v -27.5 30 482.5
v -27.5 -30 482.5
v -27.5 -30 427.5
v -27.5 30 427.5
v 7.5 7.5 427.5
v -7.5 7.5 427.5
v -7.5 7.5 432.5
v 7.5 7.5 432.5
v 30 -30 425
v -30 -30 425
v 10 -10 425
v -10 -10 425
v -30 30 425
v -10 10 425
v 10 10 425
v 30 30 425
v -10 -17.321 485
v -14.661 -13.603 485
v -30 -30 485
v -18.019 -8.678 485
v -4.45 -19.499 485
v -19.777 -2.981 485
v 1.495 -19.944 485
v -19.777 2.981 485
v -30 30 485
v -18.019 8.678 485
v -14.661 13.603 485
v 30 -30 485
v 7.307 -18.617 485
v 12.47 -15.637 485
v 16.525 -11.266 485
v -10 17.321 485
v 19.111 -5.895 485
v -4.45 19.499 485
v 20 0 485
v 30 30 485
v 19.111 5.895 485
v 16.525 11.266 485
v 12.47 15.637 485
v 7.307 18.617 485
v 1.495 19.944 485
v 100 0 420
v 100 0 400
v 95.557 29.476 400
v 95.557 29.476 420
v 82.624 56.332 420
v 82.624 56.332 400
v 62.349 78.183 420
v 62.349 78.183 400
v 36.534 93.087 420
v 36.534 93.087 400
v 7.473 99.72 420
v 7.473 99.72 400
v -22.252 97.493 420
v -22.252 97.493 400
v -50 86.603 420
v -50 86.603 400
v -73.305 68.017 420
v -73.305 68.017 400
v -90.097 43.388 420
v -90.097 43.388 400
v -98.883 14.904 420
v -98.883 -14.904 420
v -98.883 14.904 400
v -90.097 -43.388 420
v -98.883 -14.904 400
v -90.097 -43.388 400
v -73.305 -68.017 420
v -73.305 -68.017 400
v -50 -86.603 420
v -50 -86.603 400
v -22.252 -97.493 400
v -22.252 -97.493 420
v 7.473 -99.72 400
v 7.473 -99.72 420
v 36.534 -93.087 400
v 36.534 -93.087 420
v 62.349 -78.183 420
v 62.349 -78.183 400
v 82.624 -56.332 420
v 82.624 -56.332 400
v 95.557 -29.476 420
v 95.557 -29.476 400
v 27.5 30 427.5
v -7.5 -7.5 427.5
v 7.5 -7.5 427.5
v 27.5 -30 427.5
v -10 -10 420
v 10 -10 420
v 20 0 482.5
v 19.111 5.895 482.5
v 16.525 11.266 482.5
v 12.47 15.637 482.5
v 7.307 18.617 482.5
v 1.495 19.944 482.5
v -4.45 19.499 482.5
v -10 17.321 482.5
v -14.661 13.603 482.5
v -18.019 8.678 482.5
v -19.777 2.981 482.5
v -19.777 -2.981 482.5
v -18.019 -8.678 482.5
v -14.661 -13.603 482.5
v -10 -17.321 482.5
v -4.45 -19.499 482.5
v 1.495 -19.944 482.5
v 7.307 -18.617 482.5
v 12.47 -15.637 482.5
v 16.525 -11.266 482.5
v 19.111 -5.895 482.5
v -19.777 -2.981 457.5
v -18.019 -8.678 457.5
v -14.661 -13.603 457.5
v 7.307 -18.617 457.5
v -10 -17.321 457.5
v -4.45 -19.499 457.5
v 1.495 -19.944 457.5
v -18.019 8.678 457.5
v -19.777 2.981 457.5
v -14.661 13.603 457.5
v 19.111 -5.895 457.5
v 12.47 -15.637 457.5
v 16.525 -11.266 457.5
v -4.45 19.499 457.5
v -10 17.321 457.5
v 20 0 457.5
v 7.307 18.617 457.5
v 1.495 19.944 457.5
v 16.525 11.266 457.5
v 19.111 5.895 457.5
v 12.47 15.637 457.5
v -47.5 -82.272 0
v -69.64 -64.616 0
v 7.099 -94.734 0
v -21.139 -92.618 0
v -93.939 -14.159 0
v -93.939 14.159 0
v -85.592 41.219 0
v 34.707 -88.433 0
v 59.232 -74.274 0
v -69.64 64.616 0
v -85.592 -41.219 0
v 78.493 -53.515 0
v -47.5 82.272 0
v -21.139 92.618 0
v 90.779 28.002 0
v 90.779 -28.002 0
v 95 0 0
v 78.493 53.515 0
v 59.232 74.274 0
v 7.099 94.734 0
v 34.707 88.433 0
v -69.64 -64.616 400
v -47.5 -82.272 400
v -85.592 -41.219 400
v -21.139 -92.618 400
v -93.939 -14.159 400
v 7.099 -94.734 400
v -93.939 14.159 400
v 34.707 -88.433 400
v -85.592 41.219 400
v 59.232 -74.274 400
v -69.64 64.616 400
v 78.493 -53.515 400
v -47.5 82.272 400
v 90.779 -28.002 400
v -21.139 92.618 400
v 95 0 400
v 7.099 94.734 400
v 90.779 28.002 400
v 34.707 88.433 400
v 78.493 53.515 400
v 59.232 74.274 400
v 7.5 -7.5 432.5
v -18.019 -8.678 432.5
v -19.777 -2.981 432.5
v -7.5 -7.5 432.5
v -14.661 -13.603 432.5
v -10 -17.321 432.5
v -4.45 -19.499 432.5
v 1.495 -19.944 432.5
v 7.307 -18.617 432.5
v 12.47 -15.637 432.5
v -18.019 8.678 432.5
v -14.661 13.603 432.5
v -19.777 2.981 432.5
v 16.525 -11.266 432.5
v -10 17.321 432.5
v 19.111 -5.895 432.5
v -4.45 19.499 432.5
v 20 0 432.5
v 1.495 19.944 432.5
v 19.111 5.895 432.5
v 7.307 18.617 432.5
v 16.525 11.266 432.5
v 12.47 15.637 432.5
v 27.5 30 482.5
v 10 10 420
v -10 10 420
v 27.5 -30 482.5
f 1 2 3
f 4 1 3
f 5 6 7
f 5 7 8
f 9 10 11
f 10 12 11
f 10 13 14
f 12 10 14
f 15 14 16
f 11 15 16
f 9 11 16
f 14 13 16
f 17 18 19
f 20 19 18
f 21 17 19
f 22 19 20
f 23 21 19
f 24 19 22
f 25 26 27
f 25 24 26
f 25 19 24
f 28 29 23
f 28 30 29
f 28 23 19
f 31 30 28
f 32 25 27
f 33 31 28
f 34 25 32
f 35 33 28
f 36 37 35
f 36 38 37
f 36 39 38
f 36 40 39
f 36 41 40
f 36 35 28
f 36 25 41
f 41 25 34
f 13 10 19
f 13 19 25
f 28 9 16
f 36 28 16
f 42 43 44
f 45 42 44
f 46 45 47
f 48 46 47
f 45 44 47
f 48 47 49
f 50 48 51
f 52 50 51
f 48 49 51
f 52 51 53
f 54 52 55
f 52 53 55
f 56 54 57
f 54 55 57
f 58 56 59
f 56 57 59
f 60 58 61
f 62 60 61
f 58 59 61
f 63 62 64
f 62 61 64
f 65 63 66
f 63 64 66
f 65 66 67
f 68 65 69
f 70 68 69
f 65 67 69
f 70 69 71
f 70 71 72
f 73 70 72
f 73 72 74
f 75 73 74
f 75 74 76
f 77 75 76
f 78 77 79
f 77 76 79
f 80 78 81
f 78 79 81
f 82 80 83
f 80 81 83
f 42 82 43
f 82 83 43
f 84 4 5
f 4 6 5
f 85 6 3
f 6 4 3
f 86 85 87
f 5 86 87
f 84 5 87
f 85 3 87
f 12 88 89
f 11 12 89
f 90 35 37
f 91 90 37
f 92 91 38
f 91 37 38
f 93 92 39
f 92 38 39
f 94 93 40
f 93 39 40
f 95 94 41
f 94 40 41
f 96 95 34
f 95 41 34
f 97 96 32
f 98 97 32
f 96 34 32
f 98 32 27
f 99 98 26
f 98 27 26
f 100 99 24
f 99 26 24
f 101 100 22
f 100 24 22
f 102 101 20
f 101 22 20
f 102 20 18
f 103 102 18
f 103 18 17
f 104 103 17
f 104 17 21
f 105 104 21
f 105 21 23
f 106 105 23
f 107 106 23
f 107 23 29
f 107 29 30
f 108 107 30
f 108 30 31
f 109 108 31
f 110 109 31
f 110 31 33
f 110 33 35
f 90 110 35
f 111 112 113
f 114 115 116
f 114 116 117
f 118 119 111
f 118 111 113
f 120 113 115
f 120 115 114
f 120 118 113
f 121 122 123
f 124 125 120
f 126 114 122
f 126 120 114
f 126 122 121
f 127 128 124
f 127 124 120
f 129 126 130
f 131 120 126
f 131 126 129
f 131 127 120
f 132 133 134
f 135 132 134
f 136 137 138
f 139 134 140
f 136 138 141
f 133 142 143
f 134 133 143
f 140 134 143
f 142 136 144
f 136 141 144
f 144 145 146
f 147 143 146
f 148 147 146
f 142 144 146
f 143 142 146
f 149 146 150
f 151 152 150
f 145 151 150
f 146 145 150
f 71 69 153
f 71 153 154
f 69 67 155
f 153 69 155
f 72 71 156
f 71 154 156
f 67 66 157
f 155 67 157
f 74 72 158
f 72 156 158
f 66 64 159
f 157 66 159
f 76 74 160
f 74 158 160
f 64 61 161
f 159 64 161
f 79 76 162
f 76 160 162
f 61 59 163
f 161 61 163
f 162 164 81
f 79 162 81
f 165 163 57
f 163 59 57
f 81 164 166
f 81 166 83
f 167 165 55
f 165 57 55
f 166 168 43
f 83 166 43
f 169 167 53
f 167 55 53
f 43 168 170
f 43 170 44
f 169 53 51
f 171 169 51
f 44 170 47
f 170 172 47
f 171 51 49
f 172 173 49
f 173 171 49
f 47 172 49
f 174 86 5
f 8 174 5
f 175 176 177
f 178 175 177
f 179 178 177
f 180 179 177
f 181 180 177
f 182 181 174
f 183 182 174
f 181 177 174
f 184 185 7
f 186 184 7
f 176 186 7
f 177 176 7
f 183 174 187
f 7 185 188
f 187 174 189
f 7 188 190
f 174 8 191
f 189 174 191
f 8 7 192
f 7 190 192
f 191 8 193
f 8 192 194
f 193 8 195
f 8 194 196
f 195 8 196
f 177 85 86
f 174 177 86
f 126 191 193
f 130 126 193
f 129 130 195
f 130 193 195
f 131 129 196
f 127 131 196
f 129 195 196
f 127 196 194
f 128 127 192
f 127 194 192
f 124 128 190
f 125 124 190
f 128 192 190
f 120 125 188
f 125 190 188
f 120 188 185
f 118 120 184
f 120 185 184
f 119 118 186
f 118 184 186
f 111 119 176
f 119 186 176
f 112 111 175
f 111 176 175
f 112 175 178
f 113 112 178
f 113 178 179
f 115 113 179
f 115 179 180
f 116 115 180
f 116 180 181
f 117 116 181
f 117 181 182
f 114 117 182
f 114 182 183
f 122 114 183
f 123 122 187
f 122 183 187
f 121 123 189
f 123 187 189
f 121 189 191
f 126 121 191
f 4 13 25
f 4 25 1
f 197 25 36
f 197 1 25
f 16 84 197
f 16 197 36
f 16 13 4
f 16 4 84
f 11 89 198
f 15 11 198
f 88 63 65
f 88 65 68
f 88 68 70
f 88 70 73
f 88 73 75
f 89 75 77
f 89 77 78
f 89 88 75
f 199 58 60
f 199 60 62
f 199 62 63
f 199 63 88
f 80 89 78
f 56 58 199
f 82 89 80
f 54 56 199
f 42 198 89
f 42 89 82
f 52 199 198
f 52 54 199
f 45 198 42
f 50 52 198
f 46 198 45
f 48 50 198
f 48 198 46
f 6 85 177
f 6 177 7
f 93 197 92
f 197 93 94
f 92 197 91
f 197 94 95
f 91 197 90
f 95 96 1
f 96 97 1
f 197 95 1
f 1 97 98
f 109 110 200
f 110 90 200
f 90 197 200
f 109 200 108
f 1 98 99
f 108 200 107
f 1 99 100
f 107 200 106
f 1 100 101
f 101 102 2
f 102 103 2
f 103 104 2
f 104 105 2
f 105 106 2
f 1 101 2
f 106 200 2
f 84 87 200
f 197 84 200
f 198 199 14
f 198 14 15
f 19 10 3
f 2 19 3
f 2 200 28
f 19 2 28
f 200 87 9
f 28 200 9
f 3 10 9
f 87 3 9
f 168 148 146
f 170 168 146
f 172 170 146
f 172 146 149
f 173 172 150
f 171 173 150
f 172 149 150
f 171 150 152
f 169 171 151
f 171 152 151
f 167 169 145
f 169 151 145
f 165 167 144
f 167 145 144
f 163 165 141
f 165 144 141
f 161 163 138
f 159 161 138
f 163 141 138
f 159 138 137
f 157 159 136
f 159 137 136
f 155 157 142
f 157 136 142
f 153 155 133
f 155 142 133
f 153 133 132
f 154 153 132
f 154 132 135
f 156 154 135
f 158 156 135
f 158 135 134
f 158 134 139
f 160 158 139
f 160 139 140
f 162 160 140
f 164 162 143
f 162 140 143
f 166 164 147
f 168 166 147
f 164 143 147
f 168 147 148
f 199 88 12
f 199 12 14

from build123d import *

# Parameters (mm, degrees)
F0_R      = 95
F1_DEPTH  = 400
F2_R      = 100
F2_R_2    = 95
F3_DEPTH  = 20
F4_W      = 20
F4_H      = 20
F5_DEPTH  = 5
F6_W      = 60
F6_H      = 60
F6_W_2    = 20
F6_H_2    = 20
F7_W      = 20
F7_H      = 20
F8_DEPTH  = 60
F10_DEPTH = 130.001
F11_R     = 20
F12_DEPTH = 25
F13_W     = 15
F13_H     = 15
F14_DEPTH = 5
F15_R     = 20
F15_W     = 15
F15_H     = 15
F16_DEPTH = 25


with BuildPart() as f1:
    # F0 (on Top) → F1 (new body)
    with BuildSketch(Plane.XY):
        Circle(F0_R)
    extrude(amount=F1_DEPTH)

    # F2 (on face) → F3 (join)
    with BuildSketch(Plane.XY.offset(400)):
        Circle(F2_R)
        Circle(F2_R_2, mode=Mode.SUBTRACT)
        Circle(F2_R_2)
    extrude(amount=F3_DEPTH)

    # F4 (on face) → F5 (join)
    with BuildSketch(Plane.XY.offset(420)):
        Rectangle(F4_W, F4_H)
    extrude(amount=F5_DEPTH)

    # F6 (on face) + F7 (on face) → F8 (join)
    with BuildSketch(Plane.XY.offset(425)):
        Rectangle(F6_W, F6_H)
        Rectangle(F6_W_2, F6_H_2, mode=Mode.SUBTRACT)
    with BuildSketch(Plane.XY.offset(425)):
        Rectangle(F7_W, F7_H)
    extrude(amount=F8_DEPTH)

    # F9 (on face) → F10 (cut, through all)
    with BuildSketch(Plane.XZ.offset(30)):
        Polygon((-27.5, 427.5), (0, 427.5), (27.5, 427.5), (27.5, 482.5), (0, 482.5), (-27.5, 482.5), align=None)
    extrude(amount=-F10_DEPTH, mode=Mode.SUBTRACT)

    # F11 (on face) → F12 (cut)
    with BuildSketch(Plane.XY.offset(485)):
        Circle(F11_R)
    extrude(amount=-F12_DEPTH, mode=Mode.SUBTRACT)

    # F13 (on face) → F14 (join)
    with BuildSketch(Plane.XY.offset(427.5)):
        Rectangle(F13_W, F13_H)
    extrude(amount=F14_DEPTH)

    # F15 (on face) → F16 (join)
    with BuildSketch(Plane.XY.offset(432.5)):
        Circle(F15_R)
        Rectangle(F15_W, F15_H, mode=Mode.SUBTRACT)
        Rectangle(F15_W, F15_H)
    extrude(amount=F16_DEPTH)


solid = f1.part
